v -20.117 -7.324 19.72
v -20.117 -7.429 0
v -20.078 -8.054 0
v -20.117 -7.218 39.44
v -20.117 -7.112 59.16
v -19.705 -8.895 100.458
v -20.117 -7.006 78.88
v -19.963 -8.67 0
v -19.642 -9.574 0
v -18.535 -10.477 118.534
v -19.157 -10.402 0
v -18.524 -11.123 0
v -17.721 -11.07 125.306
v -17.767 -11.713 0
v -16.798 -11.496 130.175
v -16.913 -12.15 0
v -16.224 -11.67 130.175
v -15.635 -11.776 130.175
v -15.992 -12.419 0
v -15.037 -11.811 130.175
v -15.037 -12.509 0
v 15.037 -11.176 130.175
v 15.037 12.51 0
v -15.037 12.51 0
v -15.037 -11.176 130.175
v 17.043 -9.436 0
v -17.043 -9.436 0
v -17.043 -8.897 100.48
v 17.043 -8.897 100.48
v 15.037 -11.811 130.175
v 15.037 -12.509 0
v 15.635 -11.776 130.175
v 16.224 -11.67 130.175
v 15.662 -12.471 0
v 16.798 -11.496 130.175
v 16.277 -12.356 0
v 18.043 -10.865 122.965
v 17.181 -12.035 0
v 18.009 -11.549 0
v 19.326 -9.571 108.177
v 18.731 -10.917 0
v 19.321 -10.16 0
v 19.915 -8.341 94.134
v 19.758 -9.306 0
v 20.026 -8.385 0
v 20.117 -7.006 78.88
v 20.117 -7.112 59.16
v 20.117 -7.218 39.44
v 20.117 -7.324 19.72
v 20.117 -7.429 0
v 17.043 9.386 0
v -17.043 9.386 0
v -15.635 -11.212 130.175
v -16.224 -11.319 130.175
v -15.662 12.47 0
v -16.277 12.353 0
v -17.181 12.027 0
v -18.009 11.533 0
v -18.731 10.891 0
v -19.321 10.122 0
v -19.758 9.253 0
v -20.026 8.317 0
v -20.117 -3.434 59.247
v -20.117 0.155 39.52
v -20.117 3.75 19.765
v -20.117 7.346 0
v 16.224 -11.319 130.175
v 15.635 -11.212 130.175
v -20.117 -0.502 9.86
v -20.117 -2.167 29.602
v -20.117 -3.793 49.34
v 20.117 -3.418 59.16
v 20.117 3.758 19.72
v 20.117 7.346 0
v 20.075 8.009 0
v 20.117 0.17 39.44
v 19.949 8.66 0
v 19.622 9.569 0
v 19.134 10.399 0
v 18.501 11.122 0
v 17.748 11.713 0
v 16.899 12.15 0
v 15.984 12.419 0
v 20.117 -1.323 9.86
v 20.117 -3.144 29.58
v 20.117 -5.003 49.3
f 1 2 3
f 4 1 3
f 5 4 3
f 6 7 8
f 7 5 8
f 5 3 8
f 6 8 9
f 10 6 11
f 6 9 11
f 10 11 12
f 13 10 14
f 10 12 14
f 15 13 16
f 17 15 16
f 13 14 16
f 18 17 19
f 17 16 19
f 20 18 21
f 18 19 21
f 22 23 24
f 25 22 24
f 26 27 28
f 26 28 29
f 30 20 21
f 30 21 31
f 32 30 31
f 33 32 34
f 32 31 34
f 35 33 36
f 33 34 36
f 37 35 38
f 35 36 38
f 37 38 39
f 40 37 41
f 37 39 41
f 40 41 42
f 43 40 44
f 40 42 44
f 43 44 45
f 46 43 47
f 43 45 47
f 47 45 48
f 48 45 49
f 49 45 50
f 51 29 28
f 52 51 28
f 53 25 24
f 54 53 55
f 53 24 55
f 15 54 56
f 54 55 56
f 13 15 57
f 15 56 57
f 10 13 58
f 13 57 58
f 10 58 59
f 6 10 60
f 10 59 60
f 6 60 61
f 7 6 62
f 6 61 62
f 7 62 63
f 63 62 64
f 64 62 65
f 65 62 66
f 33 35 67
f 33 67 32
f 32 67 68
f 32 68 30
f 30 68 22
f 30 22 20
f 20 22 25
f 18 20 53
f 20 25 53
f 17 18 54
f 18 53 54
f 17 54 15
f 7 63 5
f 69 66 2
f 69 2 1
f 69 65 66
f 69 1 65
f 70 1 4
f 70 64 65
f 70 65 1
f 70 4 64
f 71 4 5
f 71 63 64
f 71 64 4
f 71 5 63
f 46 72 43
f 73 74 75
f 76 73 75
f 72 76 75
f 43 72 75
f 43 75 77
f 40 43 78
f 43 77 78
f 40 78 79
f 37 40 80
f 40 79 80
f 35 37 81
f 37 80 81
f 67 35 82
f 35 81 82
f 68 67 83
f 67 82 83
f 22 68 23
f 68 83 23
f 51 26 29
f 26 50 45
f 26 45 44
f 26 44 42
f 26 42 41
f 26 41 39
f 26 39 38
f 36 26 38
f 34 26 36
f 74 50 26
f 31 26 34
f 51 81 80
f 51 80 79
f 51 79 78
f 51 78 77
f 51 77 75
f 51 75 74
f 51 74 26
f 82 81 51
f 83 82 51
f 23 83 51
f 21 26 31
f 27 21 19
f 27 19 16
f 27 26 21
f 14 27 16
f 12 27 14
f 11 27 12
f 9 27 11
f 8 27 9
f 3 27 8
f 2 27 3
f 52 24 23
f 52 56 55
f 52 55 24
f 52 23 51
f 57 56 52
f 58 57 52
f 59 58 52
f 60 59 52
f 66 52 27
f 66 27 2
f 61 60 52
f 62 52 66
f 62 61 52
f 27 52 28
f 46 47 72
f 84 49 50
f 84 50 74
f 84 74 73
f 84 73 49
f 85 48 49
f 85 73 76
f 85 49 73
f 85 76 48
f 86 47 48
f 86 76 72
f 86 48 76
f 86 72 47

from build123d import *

# Parameters (mm, degrees)
SHELL1_T  = -3.0734
FILLET1_R = 5.08


with BuildPart() as part:
    # Sketch1 → Loft1 section 0
    with BuildSketch(Plane.XY):
        with BuildLine():
            Line((20.1168, 12.5095), (-20.1168, 12.5095))
            Line((-20.1168, 12.5095), (-20.1168, -12.5095))
            Line((-20.1168, -12.5095), (20.1168, -12.5095))
            Line((20.1168, -12.5095), (20.1168, 12.5095))
        make_face()
    # 3DSketch1 → Loft1 section 1
    with BuildSketch(Plane(origin=(-20.1168, -11.811, 130.175), x_dir=(0.9998754744294865, 0.015780862917132092, 0), z_dir=(0, 0, 1))):
        with BuildLine():
            Line((0, 0), (40.228589888, -0.634920926))
            Line((40.228589888, -0.634920926), (40.238610736, 0))
            Line((40.238610736, 0), (0.010020848, 0.634920926))
            Line((0.010020848, 0.634920926), (0, 0))
        make_face()
    loft()

    # Shell1
    shell1_openings = [part.faces().sort_by_distance(p)[0] for p in [
        (0, 0, 0),
    ]]
    offset(amount=SHELL1_T, openings=shell1_openings, kind=Kind.INTERSECTION)

    # Fillet1
    # the kernel refuses this fillet: 5.08 mm, written as the material it takes off along each edge
    with BuildSketch(Plane(origin=(20.1168, 14.78295414, -12.494855192), x_dir=(-1, 0, 0), z_dir=(0, -0.1790121369959656, 0.9838468655274243))) as fillet1_piece_1:
        with BuildLine():
            CenterArc((FILLET1_R, FILLET1_R), FILLET1_R, 180, 90)
            Line((0, FILLET1_R), (0, 0))
            Line((0, 0), (FILLET1_R, 0))
        make_face()
    extrude(amount=157.712257691, mode=Mode.SUBTRACT)
    with BuildSketch(Plane(origin=(-20.1168, 14.78295414, -12.494855192), x_dir=(1, 0, 0), z_dir=(0, -0.17901213699596547, 0.9838468655274243))) as fillet1_piece_2:
        with BuildLine():
            CenterArc((FILLET1_R, -FILLET1_R), FILLET1_R, 90, 90)
            Line((0, -FILLET1_R), (0, 0))
            Line((0, 0), (FILLET1_R, 0))
        make_face()
    extrude(amount=157.712257691, mode=Mode.SUBTRACT)
    with BuildSketch(Plane(origin=(-20.1168, -12.57764536, -12.699817172), x_dir=(0, 0.9999856041181256, -0.005365776412341061), z_dir=(0, 0.0053657764123410615, 0.9999856041181258)), Plane(origin=(20.1168, -12.57764536, -12.699817172), x_dir=(-1, 0, 0), z_dir=(0, 0.0053657764123410485, 0.9999856041181258))) as fillet1_piece_3:
        with BuildLine():
            CenterArc((FILLET1_R, -FILLET1_R), FILLET1_R, 90, 90)
            Line((0, -FILLET1_R), (0, 0))
            Line((0, 0), (FILLET1_R, 0))
        make_face()
    extrude(amount=155.576874011, mode=Mode.SUBTRACT)


solid = part.part
